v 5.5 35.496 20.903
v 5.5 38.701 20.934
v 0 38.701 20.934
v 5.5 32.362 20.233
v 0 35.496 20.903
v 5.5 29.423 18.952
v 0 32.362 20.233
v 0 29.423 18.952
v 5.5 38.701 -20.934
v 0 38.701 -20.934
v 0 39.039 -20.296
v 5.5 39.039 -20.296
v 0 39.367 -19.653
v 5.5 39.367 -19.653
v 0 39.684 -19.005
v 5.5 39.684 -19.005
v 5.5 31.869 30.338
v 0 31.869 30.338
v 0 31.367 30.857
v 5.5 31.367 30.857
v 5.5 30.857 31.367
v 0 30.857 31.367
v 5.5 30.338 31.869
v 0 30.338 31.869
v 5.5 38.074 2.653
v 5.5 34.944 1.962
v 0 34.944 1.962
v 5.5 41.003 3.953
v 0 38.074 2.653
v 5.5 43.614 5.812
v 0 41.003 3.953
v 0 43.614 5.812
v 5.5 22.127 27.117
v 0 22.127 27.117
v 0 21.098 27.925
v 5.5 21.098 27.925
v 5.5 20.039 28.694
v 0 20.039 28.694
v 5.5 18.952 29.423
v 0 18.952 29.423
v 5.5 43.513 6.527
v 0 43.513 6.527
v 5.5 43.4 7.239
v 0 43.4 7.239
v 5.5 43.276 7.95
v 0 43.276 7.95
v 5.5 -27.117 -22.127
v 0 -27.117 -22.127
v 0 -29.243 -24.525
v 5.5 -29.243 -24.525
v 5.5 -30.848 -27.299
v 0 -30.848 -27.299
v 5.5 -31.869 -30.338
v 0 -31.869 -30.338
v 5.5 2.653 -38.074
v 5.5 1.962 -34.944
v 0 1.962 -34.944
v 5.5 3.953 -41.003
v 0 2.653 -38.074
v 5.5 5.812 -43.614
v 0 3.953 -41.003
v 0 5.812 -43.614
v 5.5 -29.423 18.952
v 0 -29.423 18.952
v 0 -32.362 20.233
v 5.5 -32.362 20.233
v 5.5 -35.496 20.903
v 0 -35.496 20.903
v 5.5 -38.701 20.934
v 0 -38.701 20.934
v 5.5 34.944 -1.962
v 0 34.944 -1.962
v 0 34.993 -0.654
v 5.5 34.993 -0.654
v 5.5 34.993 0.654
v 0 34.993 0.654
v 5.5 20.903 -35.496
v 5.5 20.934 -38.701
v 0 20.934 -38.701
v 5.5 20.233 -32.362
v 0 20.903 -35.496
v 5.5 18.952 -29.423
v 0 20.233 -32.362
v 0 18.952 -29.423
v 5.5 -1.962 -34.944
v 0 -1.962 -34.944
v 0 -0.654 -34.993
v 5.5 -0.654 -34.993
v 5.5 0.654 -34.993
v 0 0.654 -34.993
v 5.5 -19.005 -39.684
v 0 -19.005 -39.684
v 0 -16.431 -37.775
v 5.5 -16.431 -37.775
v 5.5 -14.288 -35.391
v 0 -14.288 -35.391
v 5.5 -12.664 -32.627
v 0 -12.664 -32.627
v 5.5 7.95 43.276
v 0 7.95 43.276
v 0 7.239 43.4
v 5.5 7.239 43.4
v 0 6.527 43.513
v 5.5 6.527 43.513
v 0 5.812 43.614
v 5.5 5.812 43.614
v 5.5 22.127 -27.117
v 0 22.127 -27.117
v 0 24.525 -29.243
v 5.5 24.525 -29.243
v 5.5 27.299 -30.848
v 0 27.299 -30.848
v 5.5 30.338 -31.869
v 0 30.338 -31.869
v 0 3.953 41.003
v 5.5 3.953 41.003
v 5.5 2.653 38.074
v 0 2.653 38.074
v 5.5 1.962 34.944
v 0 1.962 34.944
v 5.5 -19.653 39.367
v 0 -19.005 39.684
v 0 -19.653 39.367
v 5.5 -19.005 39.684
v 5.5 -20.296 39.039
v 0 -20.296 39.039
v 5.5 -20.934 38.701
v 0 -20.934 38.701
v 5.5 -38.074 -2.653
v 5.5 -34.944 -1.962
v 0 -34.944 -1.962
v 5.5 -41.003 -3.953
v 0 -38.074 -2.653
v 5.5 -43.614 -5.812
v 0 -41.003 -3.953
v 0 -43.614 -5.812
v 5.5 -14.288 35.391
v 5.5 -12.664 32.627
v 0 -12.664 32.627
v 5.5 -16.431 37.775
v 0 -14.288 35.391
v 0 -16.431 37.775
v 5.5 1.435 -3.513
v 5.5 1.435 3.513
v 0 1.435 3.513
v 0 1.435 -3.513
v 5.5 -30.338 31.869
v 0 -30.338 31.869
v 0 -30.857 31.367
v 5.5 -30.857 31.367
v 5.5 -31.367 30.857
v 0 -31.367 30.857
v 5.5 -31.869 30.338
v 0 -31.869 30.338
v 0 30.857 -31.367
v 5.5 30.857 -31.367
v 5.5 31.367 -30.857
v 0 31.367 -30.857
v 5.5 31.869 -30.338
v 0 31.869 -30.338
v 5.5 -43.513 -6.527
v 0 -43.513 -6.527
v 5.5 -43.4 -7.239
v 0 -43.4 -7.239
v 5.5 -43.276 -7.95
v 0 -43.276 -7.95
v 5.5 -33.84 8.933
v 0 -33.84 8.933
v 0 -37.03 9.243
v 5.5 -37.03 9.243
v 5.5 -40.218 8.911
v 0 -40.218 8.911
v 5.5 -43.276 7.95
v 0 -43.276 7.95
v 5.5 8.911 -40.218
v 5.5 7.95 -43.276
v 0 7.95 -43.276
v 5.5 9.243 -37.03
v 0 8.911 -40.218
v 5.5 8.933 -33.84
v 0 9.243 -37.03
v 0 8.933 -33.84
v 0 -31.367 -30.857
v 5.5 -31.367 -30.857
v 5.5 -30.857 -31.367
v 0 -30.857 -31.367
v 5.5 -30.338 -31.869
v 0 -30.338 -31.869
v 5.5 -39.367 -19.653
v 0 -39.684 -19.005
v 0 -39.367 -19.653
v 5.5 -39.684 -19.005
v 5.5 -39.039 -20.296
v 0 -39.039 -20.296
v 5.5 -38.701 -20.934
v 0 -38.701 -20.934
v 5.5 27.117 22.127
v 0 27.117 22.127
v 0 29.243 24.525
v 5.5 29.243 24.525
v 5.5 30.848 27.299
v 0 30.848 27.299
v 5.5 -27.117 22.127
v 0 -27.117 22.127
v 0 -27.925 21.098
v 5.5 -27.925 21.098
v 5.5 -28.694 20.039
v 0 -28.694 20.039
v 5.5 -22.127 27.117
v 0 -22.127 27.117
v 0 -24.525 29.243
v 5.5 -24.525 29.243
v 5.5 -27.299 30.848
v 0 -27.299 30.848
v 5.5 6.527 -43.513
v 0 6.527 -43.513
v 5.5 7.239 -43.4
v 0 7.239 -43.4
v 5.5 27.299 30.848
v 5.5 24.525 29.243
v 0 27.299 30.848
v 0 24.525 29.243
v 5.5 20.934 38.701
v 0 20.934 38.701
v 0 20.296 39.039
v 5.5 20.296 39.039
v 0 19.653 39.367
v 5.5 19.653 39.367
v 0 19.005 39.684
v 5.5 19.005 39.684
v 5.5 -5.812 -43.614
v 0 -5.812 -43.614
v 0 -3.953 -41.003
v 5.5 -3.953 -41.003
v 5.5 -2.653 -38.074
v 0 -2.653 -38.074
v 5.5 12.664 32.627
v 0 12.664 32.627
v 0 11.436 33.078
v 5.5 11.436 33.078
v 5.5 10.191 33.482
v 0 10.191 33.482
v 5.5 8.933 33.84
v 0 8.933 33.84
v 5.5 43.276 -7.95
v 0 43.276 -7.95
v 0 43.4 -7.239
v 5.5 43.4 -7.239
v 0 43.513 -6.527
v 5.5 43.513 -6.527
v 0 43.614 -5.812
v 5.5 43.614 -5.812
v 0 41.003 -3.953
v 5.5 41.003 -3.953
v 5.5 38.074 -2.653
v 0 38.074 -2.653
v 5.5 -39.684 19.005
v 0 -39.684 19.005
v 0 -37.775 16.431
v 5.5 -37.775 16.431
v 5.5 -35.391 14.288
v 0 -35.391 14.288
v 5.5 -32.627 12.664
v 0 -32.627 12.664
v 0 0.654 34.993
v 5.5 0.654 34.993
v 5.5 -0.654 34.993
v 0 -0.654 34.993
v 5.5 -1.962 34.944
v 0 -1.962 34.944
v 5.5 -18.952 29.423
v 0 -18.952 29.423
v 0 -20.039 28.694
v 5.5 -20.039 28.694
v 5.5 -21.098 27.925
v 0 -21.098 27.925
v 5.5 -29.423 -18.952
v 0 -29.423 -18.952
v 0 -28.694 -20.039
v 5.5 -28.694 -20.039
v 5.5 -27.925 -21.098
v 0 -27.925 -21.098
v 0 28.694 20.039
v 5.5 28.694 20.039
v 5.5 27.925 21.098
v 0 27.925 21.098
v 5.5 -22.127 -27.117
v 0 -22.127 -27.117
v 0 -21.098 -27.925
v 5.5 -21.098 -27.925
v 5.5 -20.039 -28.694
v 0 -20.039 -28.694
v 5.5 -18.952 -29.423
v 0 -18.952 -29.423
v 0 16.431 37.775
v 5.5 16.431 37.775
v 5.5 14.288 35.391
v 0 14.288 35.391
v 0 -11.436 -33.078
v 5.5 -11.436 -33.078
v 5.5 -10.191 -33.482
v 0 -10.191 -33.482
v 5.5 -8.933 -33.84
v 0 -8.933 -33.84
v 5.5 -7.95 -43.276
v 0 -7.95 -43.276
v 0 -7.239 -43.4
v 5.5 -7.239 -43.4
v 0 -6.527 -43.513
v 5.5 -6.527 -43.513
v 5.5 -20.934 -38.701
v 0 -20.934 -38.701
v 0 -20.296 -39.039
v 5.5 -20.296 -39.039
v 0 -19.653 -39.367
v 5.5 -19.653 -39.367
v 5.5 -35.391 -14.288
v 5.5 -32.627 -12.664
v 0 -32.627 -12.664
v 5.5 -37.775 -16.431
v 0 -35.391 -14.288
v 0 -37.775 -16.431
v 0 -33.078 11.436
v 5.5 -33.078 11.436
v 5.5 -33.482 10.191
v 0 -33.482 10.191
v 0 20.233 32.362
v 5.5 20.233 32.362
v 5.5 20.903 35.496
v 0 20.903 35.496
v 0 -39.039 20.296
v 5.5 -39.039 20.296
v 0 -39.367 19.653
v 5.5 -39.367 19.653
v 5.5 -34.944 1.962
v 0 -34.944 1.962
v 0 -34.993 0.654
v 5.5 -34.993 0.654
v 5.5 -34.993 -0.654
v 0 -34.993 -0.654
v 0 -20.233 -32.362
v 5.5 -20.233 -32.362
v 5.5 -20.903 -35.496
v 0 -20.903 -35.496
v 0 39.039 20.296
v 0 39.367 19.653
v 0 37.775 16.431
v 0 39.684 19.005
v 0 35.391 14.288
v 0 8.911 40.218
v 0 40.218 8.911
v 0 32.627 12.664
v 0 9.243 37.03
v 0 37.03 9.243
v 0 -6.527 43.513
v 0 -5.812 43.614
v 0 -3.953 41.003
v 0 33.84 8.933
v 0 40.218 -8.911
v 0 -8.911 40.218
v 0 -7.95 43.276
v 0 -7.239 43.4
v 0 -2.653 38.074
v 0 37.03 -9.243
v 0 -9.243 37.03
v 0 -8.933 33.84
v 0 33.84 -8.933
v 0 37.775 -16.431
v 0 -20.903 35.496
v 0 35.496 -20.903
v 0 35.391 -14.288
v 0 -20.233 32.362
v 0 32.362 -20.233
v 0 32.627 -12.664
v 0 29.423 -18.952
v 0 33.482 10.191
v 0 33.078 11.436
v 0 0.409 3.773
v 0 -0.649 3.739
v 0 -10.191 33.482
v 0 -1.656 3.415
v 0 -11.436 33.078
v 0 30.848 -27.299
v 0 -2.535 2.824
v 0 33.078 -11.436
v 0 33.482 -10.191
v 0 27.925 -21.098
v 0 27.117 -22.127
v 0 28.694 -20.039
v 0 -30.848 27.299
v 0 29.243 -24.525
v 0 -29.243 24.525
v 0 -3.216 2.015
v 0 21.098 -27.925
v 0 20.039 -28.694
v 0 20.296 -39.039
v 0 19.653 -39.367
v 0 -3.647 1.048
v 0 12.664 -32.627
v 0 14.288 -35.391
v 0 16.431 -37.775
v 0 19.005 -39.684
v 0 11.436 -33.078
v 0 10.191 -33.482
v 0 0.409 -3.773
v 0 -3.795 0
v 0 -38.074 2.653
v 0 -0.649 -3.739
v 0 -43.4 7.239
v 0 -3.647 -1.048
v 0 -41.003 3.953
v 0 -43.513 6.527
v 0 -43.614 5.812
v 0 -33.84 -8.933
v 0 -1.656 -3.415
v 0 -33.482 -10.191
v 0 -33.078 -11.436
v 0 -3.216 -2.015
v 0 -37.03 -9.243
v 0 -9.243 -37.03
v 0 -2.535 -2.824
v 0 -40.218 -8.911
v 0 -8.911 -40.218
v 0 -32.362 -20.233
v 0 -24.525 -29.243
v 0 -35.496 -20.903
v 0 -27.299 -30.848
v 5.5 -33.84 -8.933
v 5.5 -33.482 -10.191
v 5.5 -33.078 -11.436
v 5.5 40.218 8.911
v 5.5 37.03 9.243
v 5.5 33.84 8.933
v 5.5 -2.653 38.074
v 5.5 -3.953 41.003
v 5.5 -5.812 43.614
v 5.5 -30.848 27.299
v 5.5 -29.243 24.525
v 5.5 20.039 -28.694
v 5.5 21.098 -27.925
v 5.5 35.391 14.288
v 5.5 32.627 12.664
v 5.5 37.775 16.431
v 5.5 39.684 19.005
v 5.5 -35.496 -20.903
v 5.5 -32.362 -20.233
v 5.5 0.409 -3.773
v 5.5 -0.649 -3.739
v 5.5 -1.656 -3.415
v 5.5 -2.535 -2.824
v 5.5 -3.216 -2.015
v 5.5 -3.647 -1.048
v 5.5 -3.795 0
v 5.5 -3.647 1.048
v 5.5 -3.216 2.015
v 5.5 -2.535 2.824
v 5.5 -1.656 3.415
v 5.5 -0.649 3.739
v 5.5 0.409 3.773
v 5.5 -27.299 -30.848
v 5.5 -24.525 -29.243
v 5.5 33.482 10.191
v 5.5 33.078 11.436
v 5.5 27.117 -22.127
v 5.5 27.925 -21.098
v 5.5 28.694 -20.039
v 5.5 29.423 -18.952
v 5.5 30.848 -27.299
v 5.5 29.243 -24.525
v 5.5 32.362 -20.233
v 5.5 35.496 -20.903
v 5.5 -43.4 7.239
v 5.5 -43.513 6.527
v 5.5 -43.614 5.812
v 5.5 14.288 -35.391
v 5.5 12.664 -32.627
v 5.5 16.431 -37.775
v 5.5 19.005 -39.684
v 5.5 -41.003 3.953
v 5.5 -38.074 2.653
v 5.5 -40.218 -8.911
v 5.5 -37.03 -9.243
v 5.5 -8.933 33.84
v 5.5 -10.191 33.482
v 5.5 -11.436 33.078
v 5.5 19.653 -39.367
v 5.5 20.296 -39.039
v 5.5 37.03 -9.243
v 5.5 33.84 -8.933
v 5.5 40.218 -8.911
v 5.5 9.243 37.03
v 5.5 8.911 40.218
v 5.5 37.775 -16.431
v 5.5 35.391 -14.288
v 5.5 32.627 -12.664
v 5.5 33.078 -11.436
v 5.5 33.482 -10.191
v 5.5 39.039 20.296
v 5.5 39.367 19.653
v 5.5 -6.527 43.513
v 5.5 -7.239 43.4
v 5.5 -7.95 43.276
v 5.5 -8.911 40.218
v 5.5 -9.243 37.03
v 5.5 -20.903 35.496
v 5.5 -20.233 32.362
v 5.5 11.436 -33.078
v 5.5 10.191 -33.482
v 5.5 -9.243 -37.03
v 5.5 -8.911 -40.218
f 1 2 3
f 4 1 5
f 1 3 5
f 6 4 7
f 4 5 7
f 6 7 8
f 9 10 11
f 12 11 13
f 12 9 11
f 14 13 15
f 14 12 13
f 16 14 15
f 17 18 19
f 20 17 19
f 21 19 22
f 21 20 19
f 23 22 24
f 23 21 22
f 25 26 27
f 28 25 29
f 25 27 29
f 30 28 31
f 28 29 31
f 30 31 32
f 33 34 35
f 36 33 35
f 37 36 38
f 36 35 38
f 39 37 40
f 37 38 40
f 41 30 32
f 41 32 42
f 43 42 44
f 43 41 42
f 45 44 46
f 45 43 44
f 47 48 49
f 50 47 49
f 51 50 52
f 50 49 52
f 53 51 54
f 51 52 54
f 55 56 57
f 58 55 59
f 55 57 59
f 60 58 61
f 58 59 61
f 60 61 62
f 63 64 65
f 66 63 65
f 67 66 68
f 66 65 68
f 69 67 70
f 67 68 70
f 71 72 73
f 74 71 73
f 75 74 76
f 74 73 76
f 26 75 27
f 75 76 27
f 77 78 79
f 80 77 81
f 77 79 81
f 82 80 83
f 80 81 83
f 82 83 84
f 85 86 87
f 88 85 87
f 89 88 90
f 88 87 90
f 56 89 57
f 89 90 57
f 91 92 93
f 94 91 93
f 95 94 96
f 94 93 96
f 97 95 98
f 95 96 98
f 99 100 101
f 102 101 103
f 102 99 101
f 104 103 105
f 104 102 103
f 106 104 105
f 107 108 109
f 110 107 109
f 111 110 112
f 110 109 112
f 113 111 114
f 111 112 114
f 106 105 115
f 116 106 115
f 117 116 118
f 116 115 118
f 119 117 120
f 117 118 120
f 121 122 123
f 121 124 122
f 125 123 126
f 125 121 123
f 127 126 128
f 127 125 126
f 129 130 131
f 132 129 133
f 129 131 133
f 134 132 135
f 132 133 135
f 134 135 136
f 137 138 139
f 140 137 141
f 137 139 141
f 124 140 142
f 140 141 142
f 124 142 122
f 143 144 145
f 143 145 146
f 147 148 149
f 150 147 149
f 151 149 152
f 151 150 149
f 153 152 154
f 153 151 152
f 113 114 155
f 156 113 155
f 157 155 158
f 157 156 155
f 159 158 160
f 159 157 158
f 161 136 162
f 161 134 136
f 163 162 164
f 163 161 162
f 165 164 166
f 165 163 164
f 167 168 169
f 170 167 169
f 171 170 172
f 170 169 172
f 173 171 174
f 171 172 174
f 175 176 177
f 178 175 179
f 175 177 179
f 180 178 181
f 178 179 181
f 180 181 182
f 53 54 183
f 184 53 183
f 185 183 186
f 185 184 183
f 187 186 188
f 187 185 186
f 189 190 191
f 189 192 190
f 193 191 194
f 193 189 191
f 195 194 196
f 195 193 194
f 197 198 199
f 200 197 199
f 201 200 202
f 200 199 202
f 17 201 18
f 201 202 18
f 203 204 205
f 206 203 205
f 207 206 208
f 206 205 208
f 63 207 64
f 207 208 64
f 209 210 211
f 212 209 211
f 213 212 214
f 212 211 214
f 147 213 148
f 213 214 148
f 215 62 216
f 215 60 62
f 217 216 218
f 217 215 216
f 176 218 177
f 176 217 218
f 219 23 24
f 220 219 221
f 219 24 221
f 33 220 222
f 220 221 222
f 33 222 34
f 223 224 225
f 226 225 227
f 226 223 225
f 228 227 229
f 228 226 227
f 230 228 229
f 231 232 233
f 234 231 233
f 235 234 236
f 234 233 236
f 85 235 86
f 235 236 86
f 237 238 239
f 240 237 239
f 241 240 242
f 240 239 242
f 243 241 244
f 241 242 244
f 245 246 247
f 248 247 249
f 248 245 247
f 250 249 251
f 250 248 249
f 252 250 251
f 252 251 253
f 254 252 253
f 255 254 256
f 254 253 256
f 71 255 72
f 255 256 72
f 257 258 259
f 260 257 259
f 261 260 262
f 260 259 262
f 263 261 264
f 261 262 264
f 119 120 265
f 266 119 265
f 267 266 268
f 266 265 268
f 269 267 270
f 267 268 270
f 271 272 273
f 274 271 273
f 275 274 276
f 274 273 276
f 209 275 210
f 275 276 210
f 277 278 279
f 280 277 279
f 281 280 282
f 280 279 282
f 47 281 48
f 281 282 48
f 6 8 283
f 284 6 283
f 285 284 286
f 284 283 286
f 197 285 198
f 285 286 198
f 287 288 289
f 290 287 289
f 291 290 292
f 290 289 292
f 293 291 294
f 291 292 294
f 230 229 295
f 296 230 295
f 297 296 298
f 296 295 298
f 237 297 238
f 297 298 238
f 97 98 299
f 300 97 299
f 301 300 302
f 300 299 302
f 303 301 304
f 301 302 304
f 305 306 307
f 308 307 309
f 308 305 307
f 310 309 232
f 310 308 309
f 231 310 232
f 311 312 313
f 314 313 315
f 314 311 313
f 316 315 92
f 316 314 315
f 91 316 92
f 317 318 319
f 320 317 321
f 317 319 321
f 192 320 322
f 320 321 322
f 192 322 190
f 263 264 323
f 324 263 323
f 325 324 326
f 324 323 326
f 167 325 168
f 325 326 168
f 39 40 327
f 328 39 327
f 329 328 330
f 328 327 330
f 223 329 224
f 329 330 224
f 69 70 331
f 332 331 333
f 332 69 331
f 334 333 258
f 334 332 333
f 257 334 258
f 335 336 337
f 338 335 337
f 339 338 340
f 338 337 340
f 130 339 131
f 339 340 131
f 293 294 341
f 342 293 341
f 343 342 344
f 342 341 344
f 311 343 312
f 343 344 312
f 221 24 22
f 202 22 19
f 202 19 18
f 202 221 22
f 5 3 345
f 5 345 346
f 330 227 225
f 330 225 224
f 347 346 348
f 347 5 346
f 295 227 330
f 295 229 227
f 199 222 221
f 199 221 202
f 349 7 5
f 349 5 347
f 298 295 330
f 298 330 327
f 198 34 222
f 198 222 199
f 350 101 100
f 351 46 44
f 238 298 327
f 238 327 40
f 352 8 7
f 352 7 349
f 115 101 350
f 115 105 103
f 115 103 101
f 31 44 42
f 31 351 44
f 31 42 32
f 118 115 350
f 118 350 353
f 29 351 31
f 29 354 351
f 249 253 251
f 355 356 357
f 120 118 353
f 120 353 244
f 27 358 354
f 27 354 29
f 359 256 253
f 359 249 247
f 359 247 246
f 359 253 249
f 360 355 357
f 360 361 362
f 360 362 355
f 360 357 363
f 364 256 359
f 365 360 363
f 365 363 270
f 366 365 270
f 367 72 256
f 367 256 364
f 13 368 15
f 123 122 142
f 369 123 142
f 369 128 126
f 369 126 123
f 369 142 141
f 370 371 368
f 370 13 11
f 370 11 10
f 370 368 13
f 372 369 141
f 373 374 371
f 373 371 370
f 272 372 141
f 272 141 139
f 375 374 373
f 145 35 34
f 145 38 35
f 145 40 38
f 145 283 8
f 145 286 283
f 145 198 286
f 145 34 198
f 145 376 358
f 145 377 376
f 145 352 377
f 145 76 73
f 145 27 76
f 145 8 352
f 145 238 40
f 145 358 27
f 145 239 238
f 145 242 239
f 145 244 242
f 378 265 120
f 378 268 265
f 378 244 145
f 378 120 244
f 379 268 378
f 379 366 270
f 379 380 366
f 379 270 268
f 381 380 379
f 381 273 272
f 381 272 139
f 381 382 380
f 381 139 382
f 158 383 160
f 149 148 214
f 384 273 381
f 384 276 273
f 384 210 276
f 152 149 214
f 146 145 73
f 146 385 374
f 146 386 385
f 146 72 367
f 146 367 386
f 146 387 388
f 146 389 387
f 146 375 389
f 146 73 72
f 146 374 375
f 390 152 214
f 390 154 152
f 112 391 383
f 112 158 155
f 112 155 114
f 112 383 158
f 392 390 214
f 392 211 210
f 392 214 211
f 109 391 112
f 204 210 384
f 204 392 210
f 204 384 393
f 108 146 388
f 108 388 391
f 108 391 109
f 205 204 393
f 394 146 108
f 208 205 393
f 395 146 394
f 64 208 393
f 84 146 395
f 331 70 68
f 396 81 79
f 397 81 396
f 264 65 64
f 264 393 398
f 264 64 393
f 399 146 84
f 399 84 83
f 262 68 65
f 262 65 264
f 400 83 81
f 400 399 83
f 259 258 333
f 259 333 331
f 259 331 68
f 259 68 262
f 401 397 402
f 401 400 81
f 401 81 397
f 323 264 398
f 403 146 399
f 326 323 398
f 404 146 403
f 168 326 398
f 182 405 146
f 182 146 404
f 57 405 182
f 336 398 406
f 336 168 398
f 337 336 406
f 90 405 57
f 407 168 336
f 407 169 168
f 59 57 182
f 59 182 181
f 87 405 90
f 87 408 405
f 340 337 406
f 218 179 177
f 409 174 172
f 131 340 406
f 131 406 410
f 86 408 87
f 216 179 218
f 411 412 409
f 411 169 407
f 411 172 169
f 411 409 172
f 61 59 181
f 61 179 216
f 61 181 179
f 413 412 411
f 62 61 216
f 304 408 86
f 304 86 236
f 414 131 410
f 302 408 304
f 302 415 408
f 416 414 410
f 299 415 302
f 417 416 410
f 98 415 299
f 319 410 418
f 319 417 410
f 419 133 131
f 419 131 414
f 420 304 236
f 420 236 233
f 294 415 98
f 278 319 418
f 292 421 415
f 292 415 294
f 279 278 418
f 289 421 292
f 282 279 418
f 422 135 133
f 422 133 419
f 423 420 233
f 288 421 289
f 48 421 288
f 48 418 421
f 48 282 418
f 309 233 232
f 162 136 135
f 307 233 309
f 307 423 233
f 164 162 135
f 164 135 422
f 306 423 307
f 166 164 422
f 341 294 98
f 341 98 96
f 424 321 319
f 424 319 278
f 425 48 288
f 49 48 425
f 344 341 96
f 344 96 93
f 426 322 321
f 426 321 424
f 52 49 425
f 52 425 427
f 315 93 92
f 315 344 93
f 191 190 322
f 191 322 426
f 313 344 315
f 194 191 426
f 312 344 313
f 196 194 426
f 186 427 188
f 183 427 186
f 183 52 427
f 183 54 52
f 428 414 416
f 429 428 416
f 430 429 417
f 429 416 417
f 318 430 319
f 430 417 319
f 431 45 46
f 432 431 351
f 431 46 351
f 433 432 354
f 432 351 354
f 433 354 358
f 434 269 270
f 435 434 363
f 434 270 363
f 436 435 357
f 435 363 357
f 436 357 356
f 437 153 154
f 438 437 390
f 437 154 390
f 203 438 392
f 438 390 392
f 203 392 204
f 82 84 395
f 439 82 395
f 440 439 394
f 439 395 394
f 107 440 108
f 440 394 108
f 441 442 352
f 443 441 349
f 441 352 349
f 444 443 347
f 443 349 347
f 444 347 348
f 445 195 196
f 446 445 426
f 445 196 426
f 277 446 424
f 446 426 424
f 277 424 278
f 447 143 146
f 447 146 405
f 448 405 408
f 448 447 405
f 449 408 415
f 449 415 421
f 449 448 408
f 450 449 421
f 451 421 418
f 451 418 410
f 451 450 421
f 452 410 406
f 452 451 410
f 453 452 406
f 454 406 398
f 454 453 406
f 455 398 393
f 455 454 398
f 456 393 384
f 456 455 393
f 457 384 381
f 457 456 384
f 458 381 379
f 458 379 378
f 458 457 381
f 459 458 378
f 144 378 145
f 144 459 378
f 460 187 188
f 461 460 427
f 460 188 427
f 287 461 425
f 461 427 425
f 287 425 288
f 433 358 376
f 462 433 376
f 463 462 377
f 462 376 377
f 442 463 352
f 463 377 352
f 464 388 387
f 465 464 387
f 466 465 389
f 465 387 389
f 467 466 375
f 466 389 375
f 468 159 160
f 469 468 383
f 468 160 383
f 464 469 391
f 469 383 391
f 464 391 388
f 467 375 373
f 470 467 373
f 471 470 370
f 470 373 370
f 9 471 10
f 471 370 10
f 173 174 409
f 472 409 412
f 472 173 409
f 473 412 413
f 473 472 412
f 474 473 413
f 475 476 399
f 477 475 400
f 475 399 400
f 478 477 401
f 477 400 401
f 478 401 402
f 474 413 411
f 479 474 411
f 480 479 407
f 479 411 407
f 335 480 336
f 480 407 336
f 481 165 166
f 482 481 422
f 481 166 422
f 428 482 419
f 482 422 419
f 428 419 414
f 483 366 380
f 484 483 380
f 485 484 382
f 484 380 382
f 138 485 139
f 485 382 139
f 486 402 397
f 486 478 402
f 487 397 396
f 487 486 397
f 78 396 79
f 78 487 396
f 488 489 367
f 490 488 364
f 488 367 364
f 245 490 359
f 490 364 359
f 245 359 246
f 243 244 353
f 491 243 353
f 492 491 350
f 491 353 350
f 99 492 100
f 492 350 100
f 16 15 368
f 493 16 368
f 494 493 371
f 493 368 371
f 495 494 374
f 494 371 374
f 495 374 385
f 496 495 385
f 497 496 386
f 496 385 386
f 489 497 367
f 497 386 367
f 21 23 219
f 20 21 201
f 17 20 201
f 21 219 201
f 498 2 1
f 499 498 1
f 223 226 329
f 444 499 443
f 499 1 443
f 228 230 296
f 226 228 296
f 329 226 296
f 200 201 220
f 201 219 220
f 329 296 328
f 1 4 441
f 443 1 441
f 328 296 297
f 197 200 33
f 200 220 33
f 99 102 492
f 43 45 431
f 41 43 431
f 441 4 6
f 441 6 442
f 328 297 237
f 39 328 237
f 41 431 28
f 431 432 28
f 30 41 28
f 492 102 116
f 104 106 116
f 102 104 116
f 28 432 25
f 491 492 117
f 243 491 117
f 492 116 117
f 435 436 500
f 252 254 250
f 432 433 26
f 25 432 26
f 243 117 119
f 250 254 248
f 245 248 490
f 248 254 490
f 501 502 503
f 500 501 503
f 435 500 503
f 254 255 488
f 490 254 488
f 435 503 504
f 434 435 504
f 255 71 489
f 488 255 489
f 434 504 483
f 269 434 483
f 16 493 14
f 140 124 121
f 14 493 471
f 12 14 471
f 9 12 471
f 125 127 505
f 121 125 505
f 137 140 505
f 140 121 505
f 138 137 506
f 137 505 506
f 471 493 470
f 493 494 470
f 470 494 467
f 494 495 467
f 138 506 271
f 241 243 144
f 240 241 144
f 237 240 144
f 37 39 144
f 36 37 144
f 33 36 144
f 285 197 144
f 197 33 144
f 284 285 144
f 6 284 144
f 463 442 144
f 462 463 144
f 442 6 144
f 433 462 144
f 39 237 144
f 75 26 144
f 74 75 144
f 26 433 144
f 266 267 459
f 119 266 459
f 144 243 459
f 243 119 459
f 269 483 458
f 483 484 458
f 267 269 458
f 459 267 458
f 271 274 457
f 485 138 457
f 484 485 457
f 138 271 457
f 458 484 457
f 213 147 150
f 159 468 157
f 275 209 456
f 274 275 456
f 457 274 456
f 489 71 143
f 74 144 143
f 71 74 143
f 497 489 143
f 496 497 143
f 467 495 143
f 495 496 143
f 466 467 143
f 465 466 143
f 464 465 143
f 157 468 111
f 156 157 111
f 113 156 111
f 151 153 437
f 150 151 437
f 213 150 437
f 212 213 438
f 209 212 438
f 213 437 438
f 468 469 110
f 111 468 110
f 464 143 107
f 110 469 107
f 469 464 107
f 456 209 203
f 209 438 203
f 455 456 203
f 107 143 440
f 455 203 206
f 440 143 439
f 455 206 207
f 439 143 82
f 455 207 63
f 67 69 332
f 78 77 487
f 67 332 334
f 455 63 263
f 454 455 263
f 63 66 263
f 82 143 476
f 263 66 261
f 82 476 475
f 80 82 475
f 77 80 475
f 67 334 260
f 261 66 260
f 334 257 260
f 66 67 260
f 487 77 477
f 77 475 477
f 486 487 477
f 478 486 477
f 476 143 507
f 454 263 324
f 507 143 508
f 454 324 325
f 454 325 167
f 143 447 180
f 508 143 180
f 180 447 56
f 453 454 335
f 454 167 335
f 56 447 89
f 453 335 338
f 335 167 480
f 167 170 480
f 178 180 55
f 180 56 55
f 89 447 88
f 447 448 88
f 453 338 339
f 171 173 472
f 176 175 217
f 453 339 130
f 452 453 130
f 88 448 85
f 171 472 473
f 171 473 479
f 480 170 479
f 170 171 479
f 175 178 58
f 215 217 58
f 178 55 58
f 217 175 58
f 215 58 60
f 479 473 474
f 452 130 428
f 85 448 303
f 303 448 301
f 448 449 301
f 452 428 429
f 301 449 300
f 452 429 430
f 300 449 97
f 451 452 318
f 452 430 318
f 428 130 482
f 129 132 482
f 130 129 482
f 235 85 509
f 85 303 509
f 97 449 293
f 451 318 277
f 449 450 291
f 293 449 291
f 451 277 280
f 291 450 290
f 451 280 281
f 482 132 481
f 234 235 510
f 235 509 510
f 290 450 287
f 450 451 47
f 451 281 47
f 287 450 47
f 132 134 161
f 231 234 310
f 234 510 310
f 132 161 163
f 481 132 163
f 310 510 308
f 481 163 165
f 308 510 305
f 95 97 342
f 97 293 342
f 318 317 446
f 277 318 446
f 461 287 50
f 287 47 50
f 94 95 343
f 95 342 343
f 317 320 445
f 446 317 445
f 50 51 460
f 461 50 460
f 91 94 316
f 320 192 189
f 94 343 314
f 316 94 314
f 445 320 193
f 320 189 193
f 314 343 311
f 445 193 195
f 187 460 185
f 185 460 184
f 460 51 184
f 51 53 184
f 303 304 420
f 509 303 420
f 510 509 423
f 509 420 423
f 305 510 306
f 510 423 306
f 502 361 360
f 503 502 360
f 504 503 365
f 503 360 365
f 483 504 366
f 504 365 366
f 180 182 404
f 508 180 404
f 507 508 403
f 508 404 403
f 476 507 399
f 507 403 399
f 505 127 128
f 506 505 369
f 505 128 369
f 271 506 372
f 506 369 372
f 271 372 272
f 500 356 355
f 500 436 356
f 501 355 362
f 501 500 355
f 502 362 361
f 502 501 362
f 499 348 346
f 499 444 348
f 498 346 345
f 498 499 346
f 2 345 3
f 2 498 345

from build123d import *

# Parameters (mm, degrees)
BASPROSKE_W           = 5.5
BASPROSKE_H           = 44
TOOTHCUT_DEPTH        = 63.467991804
TEETHCUTS_COUNT       = 20
TEETHCUTS_ANGLE       = 342
BORSKE_R              = 0.5
BORE_DEPTH            = 50.0000508
CORTAR_EXTRUIR1_DEPTH = 5.5


with BuildPart() as part:
    # BasProSke → Base-Revolve (revolve)
    with BuildSketch(Plane(origin=(0, 0, 0), x_dir=(1, 0, 0), z_dir=(0, 1, 0)), mode=Mode.PRIVATE) as base_revolve_sk:
        with Locations((2.75, 22)):
            Rectangle(BASPROSKE_W, BASPROSKE_H)
    revolve(base_revolve_sk.sketch.rotate(Axis((-10, 0, 0), (1, 0, 0)), 180), axis=Axis((-10, 0, 0), (1, 0, 0)))

    # TooCutSke → ToothCut (cut, through all)
    with BuildSketch(Plane(origin=(0, 0, 0), x_dir=(0, 0, -1), z_dir=(1, 0, 0))):
        with BuildLine():
            ThreePointArc((1.961730392, 34.943978235), (0, 34.999), (-1.961730392, 34.943978235))
            ThreePointArc((-1.961730392, 34.943978235), (-3.235659864, 39.585086827), (-5.832115241, 43.637395396))
            ThreePointArc((-5.832115241, 43.637395396), (0, 44.0254), (5.832115241, 43.637395396))
            ThreePointArc((5.832115241, 43.637395396), (3.235659864, 39.585086827), (1.961730392, 34.943978235))
        make_face()
    toothcut = extrude(amount=TOOTHCUT_DEPTH, mode=Mode.SUBTRACT)

    # TeethCuts: ToothCut ×20 about axis
    teethcuts_axis = Axis((-10, 0, 0), (1, 0, 0))
    for i in range(1, TEETHCUTS_COUNT):
        add(toothcut.rotate(teethcuts_axis, i * TEETHCUTS_ANGLE / (TEETHCUTS_COUNT - 1)), mode=Mode.SUBTRACT)

    # BorSke → Bore (cut, symmetric)
    with BuildSketch(Plane(origin=(0, 0, 0), x_dir=(0, 0, -1), z_dir=(1, 0, 0))):
        with Locations(Location((0, 0, 0), (0, 0, 180))):
            Circle(BORSKE_R)
    extrude(amount=BORE_DEPTH, both=True, mode=Mode.SUBTRACT)

    # Croquis1 → Cortar-Extruir1 (cut)
    with BuildSketch(Plane(origin=(5.5, 0, 0), x_dir=(0, 0, -1), z_dir=(1, 0, 0))):
        with BuildLine():
            Line((-3.51323213, 1.435), (3.51323213, 1.435))
            ThreePointArc((3.51323213, 1.435), (0, -3.795), (-3.51323213, 1.435))
        make_face()
    extrude(amount=-CORTAR_EXTRUIR1_DEPTH, mode=Mode.SUBTRACT)


solid = part.part
